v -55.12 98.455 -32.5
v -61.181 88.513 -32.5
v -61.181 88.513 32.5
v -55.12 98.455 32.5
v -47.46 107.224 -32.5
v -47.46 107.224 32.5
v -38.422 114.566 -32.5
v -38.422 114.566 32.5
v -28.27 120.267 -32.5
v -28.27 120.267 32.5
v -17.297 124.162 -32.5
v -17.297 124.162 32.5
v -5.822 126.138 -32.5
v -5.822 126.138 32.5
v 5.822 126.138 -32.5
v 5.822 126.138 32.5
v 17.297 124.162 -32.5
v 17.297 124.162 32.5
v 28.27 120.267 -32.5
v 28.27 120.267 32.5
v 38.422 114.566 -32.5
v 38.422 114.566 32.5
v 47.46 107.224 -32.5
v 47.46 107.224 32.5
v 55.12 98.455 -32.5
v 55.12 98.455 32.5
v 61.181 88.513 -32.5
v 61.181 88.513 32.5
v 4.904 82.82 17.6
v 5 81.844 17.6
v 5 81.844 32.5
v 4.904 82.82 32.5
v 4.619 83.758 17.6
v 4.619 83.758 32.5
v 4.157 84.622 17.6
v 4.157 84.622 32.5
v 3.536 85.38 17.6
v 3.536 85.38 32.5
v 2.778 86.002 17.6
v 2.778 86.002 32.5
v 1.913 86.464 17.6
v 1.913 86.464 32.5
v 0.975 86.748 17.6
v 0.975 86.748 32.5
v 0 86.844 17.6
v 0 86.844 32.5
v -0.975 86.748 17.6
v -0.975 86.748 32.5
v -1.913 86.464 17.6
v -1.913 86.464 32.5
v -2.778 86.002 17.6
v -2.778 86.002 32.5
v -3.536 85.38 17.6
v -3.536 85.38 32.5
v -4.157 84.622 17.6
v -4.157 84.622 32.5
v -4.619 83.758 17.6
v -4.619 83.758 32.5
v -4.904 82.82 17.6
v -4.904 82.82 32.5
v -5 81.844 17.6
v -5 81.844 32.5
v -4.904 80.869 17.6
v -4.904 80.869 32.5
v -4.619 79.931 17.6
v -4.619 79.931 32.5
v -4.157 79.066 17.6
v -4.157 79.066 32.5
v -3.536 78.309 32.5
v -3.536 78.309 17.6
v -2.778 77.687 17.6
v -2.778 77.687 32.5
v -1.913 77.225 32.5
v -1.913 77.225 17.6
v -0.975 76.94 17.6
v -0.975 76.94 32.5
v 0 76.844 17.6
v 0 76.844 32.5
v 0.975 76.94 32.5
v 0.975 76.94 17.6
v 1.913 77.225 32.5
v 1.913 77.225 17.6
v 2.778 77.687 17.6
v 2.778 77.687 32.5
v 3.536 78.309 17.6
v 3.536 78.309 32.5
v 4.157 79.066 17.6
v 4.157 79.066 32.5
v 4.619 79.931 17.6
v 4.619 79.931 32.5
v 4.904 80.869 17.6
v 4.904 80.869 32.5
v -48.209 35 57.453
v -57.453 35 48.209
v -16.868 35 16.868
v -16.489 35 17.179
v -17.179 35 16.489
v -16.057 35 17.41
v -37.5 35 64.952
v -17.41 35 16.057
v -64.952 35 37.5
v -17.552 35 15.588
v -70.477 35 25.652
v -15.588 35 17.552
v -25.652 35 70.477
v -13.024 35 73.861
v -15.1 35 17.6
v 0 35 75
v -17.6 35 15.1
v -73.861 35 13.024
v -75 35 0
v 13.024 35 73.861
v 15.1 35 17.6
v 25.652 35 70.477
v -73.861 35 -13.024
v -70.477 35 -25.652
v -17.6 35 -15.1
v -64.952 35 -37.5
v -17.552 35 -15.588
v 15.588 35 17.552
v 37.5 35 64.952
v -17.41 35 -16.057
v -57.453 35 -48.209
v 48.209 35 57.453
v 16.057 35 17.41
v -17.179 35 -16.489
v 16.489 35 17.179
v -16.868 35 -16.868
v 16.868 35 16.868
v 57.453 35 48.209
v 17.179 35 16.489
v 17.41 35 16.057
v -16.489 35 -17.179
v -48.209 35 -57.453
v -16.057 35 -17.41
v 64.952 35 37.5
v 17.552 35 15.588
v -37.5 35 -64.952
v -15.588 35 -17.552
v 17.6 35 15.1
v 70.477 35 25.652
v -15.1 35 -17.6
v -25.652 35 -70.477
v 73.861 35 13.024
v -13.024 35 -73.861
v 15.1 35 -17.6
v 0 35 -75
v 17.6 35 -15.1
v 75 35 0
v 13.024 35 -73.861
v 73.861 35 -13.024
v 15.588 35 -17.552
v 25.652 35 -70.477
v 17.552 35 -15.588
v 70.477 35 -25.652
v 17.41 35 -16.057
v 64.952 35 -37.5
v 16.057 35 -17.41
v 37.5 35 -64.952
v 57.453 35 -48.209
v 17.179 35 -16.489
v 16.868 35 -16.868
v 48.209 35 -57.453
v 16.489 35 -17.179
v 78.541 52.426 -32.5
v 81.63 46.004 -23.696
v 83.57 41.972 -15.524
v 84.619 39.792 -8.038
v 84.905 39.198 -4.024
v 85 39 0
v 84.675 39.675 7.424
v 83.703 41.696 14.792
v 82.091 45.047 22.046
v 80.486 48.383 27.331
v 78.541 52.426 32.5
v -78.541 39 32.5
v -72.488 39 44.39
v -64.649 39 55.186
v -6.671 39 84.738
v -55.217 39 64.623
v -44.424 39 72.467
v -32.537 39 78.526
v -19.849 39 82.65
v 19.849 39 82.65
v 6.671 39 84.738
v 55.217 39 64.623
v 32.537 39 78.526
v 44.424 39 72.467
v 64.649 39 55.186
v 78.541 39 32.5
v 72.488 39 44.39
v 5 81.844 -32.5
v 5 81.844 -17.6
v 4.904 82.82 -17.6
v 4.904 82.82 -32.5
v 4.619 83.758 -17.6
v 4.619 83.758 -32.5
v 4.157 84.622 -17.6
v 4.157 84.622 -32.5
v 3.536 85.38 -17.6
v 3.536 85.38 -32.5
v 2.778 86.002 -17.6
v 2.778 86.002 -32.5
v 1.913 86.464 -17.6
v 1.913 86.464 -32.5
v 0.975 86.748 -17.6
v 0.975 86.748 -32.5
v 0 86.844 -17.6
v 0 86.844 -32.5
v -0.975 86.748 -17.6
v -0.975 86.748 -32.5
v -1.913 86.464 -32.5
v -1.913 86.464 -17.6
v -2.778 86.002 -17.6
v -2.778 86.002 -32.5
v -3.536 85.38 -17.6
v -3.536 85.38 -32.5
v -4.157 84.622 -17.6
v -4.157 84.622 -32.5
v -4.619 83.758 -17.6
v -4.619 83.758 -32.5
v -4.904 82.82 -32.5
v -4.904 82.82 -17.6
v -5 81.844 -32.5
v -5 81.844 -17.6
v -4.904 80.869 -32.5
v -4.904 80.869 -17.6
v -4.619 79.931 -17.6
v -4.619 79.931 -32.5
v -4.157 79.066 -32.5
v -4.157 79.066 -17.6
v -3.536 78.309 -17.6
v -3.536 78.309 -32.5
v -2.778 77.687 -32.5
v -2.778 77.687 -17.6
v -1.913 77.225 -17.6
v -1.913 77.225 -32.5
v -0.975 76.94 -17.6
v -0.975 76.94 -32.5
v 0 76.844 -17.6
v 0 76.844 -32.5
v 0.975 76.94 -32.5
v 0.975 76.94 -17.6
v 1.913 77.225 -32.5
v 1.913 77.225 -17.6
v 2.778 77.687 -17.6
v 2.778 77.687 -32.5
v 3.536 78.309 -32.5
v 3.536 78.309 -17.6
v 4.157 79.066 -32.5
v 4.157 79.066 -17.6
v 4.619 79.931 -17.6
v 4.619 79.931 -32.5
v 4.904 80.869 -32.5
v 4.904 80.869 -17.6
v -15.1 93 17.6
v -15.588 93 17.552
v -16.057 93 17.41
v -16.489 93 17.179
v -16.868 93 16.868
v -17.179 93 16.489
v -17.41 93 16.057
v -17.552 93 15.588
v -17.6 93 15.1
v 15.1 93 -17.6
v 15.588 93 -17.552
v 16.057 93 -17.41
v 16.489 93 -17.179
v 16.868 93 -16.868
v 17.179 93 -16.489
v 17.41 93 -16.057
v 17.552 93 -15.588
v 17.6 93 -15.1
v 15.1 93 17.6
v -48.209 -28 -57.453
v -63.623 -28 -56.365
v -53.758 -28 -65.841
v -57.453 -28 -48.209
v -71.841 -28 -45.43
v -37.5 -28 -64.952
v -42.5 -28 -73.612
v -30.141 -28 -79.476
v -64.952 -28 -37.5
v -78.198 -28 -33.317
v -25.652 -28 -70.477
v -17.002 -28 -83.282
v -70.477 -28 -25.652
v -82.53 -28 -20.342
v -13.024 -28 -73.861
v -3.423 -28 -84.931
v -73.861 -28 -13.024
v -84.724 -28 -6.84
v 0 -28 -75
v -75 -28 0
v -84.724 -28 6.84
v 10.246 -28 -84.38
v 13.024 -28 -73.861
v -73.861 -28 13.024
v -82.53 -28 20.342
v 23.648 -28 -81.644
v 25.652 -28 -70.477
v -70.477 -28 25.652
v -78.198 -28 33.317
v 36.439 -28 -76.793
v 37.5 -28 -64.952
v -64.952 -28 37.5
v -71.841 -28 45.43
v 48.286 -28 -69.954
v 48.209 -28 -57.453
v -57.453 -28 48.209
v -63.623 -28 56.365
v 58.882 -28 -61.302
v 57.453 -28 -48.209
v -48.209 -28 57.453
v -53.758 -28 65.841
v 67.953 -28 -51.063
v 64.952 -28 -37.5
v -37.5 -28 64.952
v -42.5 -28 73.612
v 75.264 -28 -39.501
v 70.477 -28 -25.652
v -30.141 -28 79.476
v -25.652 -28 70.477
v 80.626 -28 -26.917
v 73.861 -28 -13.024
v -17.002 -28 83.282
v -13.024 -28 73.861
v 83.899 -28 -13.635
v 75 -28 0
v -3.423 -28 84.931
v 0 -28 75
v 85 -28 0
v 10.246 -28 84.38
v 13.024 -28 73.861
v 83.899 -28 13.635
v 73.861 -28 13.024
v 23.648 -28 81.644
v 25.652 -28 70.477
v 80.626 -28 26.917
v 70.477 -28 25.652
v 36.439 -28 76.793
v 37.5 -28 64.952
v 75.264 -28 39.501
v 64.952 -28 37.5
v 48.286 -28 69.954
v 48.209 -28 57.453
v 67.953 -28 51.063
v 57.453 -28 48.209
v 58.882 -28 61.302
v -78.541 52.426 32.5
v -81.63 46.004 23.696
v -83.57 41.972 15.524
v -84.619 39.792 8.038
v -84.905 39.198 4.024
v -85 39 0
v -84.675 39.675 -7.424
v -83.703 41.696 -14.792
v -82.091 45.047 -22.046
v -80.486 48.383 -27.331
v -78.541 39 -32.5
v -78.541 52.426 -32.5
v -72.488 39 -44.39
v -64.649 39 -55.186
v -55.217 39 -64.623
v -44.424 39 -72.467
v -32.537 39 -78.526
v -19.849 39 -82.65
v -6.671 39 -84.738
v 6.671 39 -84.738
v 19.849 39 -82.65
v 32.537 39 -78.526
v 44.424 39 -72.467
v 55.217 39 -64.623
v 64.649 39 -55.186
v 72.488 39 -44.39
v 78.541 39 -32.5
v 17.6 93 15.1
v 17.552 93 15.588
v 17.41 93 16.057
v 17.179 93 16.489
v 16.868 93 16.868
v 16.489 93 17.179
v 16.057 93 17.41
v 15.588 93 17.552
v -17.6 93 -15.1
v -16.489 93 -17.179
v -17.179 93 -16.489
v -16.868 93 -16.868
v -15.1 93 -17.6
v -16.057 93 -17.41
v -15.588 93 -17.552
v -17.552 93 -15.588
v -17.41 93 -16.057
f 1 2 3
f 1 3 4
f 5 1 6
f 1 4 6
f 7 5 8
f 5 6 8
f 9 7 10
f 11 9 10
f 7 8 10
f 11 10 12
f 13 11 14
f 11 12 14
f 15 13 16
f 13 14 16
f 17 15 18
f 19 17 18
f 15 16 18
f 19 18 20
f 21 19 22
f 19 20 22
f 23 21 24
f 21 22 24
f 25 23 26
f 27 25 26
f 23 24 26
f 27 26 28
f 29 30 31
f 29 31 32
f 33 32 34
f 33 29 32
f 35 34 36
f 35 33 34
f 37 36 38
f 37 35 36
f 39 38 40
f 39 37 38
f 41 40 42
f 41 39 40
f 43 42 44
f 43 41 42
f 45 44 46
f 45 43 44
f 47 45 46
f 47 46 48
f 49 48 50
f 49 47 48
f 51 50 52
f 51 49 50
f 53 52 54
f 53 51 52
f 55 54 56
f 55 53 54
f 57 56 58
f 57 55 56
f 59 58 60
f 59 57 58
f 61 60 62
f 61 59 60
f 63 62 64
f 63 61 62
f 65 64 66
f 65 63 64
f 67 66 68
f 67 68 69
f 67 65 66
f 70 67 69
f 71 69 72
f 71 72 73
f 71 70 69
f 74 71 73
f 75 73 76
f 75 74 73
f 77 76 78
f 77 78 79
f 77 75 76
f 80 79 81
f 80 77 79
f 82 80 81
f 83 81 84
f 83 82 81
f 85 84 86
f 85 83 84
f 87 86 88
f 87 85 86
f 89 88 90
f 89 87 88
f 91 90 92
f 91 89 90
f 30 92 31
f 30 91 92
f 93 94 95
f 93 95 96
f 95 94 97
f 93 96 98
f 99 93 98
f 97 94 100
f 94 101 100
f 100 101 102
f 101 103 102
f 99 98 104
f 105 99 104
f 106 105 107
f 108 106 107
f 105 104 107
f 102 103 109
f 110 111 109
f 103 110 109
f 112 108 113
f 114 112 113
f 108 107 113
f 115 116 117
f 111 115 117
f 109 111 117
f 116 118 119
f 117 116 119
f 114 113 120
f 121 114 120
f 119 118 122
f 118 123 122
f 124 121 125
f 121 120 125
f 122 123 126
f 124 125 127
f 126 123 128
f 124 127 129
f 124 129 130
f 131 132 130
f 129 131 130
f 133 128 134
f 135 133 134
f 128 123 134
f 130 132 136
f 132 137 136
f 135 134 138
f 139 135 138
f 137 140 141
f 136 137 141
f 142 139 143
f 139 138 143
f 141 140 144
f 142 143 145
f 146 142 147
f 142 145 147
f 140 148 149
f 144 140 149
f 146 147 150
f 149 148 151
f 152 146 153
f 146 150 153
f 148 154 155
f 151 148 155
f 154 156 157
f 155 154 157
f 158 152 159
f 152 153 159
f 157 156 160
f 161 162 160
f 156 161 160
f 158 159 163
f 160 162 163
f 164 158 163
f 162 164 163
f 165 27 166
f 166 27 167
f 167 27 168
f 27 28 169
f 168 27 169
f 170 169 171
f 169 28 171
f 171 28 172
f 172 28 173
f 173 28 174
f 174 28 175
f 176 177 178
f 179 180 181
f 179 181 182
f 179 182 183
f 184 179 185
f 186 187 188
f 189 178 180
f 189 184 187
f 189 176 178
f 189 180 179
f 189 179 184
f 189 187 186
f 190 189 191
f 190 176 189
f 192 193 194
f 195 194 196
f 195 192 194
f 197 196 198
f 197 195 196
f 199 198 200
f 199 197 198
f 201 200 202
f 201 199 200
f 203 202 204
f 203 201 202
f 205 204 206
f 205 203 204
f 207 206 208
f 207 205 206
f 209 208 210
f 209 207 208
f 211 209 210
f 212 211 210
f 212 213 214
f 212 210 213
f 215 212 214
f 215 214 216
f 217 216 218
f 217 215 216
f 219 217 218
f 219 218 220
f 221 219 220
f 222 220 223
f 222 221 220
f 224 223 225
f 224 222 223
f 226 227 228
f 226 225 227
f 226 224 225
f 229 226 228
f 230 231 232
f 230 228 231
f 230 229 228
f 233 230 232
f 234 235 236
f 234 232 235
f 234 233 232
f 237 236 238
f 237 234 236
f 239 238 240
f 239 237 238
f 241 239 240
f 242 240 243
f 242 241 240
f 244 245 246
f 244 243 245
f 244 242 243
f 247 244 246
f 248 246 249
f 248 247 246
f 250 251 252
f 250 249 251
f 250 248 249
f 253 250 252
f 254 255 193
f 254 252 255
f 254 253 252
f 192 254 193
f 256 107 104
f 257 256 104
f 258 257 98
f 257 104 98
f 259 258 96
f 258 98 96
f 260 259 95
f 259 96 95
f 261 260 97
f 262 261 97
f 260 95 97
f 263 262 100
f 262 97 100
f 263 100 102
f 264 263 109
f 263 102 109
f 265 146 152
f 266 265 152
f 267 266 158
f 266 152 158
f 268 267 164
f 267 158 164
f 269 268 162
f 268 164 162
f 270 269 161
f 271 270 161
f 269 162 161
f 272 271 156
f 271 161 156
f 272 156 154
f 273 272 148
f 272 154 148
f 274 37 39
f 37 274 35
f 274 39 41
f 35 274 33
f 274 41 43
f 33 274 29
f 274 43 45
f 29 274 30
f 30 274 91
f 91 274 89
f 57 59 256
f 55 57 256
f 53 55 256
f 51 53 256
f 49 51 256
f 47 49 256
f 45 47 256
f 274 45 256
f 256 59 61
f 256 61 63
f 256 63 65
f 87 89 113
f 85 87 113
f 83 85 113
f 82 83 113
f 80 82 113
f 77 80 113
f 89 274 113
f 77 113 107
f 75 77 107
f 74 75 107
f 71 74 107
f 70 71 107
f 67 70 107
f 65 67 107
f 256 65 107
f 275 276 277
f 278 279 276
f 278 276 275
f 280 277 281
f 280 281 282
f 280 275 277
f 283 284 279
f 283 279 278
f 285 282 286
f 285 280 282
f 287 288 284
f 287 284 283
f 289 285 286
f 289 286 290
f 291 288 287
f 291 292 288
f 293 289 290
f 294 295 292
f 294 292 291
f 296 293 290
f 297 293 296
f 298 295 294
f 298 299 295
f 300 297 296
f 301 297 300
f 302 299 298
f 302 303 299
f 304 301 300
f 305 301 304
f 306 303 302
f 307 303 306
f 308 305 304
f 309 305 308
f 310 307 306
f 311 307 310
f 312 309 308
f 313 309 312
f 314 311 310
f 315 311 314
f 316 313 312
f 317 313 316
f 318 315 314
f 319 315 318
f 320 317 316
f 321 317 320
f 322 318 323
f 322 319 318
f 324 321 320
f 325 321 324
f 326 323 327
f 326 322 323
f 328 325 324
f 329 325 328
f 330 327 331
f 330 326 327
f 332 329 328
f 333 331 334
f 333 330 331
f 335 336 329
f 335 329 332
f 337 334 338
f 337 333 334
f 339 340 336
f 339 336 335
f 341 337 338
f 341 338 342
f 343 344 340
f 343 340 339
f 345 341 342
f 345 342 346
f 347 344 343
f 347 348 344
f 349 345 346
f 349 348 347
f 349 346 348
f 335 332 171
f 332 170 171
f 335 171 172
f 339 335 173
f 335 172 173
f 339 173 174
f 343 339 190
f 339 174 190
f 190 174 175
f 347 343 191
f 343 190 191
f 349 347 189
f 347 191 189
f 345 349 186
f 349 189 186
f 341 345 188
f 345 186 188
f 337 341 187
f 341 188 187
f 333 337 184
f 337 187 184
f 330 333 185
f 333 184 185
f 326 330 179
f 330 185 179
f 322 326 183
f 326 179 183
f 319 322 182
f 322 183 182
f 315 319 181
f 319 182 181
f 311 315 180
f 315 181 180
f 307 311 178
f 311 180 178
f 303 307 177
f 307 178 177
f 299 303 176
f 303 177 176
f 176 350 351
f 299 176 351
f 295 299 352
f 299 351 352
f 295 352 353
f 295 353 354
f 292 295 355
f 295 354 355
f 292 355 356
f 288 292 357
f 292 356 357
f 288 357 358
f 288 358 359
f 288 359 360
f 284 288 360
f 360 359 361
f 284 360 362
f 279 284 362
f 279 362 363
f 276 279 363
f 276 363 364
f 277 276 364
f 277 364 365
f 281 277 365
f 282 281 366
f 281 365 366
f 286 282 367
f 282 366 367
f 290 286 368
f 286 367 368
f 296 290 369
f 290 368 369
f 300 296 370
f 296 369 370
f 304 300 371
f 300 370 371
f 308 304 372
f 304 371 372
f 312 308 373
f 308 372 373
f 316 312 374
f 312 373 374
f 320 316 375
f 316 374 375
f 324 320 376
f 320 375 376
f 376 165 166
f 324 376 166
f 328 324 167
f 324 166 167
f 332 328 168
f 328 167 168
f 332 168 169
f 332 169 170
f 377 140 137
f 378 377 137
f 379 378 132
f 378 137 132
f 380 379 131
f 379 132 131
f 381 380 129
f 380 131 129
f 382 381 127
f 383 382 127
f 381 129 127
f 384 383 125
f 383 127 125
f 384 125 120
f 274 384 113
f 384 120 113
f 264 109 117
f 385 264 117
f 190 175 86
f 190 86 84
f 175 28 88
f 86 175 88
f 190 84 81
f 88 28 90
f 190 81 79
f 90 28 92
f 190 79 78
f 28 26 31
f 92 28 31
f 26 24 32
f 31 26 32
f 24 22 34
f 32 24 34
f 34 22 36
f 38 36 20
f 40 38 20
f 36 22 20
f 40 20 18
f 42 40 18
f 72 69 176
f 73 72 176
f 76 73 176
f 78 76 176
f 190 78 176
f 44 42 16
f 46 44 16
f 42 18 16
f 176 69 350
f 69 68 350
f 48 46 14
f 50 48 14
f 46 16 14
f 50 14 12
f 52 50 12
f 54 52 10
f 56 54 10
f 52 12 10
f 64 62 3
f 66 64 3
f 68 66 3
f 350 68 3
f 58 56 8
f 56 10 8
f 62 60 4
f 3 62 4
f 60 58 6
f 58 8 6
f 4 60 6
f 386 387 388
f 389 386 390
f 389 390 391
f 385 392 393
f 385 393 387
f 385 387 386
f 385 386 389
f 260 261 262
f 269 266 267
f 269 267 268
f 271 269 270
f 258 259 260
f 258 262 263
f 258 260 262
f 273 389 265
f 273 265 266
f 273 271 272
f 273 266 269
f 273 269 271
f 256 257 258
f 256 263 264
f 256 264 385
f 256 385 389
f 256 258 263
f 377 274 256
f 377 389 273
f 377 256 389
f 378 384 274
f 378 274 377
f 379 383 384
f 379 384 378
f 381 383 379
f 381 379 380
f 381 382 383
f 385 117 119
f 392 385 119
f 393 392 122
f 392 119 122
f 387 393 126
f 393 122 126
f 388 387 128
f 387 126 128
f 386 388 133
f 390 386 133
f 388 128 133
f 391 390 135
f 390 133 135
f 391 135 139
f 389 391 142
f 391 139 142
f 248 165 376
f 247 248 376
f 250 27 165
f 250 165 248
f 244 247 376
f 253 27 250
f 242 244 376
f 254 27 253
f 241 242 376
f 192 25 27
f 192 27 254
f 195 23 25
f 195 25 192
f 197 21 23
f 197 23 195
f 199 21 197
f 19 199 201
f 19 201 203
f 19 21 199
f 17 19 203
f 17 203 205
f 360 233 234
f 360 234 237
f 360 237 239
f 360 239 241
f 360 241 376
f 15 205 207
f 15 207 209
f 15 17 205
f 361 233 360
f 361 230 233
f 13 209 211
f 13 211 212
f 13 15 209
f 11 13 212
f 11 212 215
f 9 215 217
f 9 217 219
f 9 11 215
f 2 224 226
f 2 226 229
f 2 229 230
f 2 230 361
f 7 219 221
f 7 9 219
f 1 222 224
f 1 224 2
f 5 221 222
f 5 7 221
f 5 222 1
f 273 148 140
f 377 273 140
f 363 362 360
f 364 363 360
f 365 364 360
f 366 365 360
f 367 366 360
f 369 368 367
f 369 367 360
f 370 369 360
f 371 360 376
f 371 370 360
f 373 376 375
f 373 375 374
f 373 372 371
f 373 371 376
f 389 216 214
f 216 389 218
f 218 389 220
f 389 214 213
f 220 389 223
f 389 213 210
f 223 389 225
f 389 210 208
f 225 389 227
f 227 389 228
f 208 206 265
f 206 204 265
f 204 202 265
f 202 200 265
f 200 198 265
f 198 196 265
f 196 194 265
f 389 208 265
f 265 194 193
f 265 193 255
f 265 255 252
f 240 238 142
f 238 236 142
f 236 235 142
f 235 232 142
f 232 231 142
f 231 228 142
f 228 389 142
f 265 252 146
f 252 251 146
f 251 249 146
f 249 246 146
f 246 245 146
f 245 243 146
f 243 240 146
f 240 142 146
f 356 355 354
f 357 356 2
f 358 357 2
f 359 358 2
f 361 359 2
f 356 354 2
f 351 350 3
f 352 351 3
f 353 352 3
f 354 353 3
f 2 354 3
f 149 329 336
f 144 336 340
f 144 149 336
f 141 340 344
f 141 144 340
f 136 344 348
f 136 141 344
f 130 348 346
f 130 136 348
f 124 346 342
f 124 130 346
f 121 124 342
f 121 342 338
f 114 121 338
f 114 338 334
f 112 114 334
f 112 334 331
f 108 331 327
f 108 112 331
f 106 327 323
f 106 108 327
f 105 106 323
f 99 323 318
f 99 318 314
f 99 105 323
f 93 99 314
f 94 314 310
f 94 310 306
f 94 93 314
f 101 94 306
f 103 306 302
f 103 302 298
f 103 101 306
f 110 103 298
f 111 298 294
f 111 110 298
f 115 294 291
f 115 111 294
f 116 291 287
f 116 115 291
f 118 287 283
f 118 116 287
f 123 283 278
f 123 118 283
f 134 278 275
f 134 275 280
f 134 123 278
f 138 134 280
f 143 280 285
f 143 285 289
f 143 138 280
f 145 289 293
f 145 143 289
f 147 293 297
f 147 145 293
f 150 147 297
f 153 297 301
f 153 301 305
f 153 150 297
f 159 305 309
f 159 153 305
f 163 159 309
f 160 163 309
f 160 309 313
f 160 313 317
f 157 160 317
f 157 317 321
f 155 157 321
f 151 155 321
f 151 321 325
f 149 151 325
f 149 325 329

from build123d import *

# Parameters (mm, degrees)
SKETCH1_R           = 85
SKETCH1_R_2         = 75
BOSS_EXTRUDE1_DEPTH = 35
SKETCH2_R           = 85
BOSS_EXTRUDE2_DEPTH = 4
SKETCH3_R           = 5
BOSS_EXTRUDE3_DEPTH = 32.5
SKETCH4_R           = 95.738737625
SKETCH4_R_2         = 85
CUT_EXTRUDE1_DEPTH  = 67
CUT_EXTRUDE2_DEPTH  = 58
SKETCH6_R           = 85
SKETCH6_R_2         = 75
BOSS_EXTRUDE4_DEPTH = 28


with BuildPart() as part:
    # Sketch1 → Boss-Extrude1 (new body)
    with BuildSketch(Plane(origin=(0, 0, 0), x_dir=(1, 0, 0), z_dir=(0, 1, 0))):
        Circle(SKETCH1_R)
        Circle(SKETCH1_R_2, mode=Mode.SUBTRACT)
    extrude(amount=BOSS_EXTRUDE1_DEPTH)

    # Sketch2 → Boss-Extrude2 (add)
    with BuildSketch(Plane(origin=(0, 35, 0), x_dir=(1, 0, 0), z_dir=(0, 1, 0))):
        Circle(SKETCH2_R)
    extrude(amount=BOSS_EXTRUDE2_DEPTH)

    # Sketch3 → Boss-Extrude3 (add, symmetric)
    with BuildSketch(Plane.XY):
        with BuildLine():
            Line((-85, 39), (-61.181000395, 88.51271152))
            ThreePointArc((-61.181000395, 88.51271152), (0, 126.386849251), (61.181000395, 88.51271152))
            Line((61.181000395, 88.51271152), (85, 39))
            Line((85, 39), (-85, 39))
        make_face()
        with Locations((0, 81.844221237)):
            Circle(SKETCH3_R, mode=Mode.SUBTRACT)
    extrude(amount=BOSS_EXTRUDE3_DEPTH, both=True)

    # Sketch4 → Cut-Extrude1 (cut)
    with BuildSketch(Plane(origin=(0, 39, 0), x_dir=(1, 0, 0), z_dir=(0, 1, 0))):
        Circle(SKETCH4_R)
        Circle(SKETCH4_R_2, mode=Mode.SUBTRACT)
    extrude(amount=CUT_EXTRUDE1_DEPTH, mode=Mode.SUBTRACT)

    # Sketch5 → Cut-Extrude2 (cut)
    with BuildSketch(Plane.XZ.offset(-35)):
        with BuildLine():
            Line((-15.1, -17.6), (15.1, -17.6))
            ThreePointArc((15.1, -17.6), (16.867766953, -16.867766953), (17.6, -15.1))
            Line((17.6, -15.1), (17.6, 15.1))
            ThreePointArc((17.6, 15.1), (16.867766953, 16.867766953), (15.1, 17.6))
            Line((15.1, 17.6), (-15.1, 17.6))
            ThreePointArc((-15.1, 17.6), (-16.867766953, 16.867766953), (-17.6, 15.1))
            Line((-17.6, 15.1), (-17.6, -15.1))
            ThreePointArc((-17.6, -15.1), (-16.867766953, -16.867766953), (-15.1, -17.6))
        make_face()
    extrude(amount=-CUT_EXTRUDE2_DEPTH, mode=Mode.SUBTRACT)

    # Sketch6 → Boss-Extrude4 (add)
    with BuildSketch(Plane.XZ):
        Circle(SKETCH6_R)
        Circle(SKETCH6_R_2, mode=Mode.SUBTRACT)
    extrude(amount=BOSS_EXTRUDE4_DEPTH)


solid = part.part
